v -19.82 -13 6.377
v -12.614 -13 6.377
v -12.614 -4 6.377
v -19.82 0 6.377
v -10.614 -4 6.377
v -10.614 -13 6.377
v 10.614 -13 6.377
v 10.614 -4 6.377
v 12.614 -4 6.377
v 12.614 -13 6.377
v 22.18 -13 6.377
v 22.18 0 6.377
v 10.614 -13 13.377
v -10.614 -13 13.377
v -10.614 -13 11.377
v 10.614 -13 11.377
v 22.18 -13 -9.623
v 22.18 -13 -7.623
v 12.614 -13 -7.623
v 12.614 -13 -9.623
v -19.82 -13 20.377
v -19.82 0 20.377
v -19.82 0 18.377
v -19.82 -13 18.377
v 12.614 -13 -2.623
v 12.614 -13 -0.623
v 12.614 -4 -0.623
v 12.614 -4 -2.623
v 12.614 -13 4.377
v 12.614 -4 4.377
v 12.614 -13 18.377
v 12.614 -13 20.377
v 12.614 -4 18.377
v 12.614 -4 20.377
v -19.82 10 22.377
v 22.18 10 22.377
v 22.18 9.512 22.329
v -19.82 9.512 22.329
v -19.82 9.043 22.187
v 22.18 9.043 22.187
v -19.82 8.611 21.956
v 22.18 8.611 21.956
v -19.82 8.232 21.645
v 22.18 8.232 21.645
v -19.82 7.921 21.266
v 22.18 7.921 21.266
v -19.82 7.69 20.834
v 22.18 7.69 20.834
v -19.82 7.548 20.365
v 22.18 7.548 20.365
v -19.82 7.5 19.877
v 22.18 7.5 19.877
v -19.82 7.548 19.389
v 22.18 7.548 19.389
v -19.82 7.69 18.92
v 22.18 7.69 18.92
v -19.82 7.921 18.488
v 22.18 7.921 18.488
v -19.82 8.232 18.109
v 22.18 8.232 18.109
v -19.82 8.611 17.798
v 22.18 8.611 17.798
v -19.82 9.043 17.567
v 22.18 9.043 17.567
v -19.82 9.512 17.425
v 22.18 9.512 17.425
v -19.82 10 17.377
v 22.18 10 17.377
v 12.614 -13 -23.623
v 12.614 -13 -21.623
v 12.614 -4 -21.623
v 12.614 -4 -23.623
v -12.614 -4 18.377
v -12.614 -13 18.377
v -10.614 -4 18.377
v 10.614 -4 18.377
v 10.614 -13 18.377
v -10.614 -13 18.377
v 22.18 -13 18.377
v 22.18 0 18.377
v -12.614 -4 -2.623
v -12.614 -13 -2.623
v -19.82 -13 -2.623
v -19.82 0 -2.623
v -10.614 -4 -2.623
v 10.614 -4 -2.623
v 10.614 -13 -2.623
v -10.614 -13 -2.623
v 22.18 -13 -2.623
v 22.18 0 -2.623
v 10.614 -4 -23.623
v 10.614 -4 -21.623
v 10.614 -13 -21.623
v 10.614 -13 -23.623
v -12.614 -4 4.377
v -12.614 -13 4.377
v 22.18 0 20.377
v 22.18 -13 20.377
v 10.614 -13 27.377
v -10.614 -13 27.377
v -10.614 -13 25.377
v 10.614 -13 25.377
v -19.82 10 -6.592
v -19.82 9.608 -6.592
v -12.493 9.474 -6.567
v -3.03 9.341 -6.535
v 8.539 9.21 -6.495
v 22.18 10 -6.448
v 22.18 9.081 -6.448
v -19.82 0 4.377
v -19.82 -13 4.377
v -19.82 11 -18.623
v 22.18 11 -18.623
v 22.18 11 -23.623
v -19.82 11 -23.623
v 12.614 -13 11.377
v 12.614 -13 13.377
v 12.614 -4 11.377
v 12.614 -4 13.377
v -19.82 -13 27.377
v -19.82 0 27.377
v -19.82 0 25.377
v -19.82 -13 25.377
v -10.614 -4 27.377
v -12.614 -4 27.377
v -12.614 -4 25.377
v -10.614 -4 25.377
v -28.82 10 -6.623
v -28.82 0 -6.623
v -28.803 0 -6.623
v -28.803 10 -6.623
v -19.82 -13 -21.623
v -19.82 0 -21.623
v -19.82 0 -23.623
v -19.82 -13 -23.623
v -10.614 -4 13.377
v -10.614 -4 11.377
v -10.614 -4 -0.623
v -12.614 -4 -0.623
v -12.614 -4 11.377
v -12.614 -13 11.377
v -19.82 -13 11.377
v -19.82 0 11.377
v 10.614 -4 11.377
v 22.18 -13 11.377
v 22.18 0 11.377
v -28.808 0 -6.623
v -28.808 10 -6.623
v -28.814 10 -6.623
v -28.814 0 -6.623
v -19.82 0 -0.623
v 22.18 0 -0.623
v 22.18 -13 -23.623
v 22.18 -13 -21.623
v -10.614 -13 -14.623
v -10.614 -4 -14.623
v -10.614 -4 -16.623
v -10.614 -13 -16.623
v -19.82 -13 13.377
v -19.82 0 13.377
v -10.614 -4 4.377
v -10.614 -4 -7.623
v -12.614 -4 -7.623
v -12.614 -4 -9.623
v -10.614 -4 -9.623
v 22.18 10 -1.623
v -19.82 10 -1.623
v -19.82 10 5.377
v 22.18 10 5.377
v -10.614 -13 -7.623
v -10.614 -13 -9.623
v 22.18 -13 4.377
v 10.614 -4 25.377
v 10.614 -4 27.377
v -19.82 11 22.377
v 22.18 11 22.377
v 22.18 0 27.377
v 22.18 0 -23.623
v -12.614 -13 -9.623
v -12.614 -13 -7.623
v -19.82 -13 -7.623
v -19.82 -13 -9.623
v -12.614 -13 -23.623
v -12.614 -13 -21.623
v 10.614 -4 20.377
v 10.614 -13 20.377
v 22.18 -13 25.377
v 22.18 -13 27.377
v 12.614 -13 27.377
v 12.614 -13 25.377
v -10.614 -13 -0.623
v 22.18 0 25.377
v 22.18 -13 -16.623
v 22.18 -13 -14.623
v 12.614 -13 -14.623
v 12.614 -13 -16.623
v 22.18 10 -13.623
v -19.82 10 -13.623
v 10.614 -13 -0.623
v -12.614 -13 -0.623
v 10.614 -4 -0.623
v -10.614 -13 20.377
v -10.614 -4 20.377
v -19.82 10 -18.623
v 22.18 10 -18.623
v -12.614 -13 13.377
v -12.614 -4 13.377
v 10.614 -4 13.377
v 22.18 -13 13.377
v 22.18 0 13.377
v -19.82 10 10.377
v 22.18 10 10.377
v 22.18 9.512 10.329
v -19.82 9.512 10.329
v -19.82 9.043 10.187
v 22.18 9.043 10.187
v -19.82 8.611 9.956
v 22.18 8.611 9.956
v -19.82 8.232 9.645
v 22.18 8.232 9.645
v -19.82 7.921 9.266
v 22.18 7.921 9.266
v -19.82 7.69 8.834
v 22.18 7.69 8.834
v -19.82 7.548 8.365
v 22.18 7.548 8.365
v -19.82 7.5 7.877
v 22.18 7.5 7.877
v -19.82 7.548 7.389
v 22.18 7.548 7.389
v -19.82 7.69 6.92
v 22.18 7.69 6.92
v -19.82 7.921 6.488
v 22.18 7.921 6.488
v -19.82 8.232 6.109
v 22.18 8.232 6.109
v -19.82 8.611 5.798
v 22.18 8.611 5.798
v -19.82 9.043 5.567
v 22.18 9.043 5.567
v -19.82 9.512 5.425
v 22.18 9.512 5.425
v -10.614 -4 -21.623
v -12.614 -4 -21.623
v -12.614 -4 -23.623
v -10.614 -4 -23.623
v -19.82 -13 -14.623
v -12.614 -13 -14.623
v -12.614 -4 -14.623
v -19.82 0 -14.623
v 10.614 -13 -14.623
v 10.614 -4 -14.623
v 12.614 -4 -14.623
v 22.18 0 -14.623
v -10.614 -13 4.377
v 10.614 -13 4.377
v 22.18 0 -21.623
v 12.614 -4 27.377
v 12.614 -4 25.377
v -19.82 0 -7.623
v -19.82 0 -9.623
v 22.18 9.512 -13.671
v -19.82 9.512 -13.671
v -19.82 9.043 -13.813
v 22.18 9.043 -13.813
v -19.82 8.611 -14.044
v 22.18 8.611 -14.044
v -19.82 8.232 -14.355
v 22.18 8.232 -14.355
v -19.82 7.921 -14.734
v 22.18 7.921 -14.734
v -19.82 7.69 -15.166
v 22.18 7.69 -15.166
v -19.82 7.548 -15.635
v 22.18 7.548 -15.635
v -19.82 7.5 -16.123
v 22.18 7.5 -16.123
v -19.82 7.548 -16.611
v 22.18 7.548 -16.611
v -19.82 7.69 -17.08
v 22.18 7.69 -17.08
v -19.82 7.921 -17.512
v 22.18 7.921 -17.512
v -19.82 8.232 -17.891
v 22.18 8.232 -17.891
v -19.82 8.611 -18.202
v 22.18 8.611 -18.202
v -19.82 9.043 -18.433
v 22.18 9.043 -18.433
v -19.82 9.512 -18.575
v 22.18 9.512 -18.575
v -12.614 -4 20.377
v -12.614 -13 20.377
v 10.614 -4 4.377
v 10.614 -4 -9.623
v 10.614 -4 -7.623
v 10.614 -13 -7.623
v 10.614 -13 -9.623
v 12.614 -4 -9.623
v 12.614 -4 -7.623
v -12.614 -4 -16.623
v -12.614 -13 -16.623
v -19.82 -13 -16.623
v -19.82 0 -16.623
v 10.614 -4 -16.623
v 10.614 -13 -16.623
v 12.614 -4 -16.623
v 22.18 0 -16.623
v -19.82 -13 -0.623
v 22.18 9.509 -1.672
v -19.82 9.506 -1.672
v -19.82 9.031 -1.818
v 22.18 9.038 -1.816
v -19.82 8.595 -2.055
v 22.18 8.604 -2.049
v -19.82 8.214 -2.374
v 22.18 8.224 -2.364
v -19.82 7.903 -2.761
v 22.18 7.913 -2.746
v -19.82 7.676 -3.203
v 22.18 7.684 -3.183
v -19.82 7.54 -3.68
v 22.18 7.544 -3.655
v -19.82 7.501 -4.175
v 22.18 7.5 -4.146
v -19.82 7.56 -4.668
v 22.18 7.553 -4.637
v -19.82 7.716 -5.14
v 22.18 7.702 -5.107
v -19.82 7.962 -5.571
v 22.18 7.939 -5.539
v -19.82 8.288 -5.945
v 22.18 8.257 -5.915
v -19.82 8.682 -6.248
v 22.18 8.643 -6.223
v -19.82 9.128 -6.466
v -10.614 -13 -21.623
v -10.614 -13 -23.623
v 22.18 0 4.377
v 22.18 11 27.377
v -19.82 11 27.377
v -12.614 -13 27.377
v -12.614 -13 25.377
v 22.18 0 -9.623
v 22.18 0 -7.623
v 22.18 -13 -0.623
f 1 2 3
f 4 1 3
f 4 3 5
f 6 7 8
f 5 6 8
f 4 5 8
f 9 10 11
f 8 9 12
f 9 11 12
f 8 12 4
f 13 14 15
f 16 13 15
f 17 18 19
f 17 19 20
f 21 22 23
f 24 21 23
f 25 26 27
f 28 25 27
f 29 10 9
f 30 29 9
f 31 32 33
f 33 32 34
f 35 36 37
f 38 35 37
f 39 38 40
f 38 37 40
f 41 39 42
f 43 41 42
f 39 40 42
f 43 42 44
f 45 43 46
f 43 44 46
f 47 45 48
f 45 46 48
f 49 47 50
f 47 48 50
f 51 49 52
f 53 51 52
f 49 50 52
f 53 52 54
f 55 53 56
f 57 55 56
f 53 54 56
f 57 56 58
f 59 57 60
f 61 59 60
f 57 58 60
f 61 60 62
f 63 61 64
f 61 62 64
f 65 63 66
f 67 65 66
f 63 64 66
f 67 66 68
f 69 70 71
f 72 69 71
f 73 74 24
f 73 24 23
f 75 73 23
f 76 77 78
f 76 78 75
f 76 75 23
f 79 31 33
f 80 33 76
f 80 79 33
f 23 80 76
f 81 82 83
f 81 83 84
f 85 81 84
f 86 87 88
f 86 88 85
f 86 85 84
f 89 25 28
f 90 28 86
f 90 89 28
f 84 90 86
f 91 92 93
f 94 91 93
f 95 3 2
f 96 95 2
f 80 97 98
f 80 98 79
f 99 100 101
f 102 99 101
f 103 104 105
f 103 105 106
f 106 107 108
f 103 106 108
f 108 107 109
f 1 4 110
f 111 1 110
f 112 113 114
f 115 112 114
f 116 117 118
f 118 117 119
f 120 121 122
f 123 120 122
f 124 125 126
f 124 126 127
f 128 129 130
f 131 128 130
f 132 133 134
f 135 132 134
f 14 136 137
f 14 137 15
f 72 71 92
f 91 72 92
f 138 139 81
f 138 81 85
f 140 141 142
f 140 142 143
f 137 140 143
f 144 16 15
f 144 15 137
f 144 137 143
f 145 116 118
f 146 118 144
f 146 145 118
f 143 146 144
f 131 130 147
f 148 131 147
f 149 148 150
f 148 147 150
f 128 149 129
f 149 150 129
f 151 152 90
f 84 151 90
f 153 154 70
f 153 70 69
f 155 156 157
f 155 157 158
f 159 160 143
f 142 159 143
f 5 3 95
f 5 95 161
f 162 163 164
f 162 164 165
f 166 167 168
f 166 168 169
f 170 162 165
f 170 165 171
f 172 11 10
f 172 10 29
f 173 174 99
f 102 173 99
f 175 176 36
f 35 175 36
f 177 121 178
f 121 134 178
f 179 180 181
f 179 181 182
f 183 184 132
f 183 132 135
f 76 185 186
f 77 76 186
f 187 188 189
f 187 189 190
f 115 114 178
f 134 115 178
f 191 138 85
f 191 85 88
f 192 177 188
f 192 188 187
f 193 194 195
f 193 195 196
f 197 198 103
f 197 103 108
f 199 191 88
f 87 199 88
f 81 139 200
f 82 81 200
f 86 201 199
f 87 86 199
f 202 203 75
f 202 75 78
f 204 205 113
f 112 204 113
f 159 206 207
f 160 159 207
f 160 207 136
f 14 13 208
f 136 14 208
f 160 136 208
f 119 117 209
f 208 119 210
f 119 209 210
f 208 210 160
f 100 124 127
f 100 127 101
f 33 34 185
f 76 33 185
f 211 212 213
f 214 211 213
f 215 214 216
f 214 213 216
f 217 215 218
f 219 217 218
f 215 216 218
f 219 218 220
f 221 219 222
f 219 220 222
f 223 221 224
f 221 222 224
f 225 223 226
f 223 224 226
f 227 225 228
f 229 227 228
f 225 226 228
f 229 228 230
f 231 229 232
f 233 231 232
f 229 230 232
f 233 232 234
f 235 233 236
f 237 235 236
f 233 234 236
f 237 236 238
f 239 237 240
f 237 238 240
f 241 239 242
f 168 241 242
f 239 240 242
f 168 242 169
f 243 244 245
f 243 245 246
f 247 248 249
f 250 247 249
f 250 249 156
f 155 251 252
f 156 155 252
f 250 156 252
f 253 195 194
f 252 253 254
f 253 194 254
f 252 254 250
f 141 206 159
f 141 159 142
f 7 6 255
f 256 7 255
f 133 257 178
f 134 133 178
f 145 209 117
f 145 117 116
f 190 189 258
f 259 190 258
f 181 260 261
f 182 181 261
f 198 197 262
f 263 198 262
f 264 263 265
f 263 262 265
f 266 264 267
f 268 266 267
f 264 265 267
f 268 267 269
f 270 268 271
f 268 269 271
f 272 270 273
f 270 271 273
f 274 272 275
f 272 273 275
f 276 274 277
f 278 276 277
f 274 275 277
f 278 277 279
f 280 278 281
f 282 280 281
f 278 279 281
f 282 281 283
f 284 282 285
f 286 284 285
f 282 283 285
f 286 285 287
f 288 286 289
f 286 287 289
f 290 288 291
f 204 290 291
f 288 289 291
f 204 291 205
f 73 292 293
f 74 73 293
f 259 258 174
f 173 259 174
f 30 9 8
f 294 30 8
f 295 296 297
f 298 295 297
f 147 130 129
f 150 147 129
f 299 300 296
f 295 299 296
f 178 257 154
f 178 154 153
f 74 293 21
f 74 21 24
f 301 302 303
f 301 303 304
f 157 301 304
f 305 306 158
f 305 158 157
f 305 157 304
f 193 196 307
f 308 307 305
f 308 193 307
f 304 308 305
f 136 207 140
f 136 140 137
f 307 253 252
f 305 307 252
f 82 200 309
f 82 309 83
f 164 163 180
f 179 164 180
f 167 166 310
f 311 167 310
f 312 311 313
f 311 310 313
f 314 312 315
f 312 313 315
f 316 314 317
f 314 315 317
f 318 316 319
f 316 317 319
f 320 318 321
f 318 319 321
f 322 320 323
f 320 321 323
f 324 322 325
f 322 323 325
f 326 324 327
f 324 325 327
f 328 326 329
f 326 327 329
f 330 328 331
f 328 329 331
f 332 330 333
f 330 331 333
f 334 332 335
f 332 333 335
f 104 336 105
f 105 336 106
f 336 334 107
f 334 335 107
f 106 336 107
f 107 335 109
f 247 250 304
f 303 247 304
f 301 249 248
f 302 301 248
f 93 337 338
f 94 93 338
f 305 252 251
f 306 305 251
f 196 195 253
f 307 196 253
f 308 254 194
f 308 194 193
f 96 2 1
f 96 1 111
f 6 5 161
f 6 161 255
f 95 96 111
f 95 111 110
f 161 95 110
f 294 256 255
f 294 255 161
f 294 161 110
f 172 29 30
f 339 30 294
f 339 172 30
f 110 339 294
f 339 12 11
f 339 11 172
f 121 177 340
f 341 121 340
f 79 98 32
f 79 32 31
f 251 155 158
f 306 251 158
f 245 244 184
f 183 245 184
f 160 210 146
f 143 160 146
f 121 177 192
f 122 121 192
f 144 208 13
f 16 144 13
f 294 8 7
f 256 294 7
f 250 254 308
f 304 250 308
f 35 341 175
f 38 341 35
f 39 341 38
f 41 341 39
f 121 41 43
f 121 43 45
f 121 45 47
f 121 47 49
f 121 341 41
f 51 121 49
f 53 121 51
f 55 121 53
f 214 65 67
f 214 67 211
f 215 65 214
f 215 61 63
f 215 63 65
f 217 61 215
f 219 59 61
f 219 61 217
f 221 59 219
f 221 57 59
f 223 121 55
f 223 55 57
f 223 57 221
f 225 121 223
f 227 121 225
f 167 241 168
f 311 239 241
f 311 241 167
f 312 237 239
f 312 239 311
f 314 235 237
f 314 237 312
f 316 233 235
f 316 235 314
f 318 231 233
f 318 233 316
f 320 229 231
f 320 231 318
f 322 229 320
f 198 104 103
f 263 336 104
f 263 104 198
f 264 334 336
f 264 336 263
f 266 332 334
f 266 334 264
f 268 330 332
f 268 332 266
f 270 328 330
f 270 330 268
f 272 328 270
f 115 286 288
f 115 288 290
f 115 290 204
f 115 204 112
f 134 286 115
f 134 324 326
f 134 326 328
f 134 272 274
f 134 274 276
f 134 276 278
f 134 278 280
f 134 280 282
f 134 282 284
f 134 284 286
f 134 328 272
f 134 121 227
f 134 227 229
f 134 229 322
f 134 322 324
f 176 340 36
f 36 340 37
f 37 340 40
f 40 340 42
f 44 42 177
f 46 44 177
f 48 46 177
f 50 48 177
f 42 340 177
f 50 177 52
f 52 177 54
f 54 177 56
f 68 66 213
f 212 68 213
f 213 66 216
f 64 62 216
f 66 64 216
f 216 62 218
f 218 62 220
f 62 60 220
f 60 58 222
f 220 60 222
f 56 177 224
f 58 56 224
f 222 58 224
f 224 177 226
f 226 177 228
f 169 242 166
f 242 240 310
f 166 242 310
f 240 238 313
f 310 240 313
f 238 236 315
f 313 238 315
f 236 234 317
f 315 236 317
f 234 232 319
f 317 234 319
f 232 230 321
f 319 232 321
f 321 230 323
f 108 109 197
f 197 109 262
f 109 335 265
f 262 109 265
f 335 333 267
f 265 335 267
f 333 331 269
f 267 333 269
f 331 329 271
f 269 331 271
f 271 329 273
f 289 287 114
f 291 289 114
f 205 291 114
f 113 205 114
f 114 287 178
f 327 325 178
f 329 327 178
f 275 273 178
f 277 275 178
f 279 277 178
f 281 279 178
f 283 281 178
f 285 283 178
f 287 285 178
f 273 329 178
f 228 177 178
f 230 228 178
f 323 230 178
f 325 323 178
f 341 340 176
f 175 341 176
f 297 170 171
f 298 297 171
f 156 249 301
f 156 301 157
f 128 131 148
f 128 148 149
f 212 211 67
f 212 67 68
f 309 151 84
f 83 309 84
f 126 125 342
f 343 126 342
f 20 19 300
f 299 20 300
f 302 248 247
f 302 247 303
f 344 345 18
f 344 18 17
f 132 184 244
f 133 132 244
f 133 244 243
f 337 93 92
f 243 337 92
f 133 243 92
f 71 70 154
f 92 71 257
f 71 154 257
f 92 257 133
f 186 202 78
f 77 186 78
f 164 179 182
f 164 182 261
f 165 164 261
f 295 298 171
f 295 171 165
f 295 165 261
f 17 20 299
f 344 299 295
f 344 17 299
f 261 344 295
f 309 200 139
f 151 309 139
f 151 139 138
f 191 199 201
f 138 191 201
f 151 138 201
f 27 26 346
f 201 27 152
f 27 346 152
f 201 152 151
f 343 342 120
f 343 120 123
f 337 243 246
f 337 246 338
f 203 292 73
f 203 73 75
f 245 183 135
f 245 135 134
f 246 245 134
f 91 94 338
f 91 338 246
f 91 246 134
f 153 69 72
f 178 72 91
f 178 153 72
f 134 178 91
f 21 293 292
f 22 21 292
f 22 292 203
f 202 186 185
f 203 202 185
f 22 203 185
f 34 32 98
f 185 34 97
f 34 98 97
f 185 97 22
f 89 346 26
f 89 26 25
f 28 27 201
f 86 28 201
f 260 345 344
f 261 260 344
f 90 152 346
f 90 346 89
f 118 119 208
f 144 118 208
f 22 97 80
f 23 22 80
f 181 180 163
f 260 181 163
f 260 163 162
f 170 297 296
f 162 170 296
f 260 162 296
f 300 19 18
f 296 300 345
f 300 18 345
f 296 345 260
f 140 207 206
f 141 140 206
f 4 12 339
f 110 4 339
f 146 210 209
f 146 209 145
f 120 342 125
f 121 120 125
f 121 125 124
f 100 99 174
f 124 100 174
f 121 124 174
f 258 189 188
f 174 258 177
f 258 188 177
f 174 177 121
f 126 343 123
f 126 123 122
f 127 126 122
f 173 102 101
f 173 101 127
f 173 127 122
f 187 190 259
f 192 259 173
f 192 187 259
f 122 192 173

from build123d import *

# Parameters (mm, degrees)
SKETCH2_W             = 42
SKETCH2_H             = 7
BOSS_EXTRUDE1_DEPTH   = 10
BOSS_EXTRUDE1_2_DEPTH = 10
BOSS_EXTRUDE1_3_DEPTH = 10
BOSS_EXTRUDE1_4_DEPTH = 10
BOSS_EXTRUDE2_DEPTH   = 42
SKETCH4_W             = 2
SKETCH4_H             = 13
BOSS_EXTRUDE3_DEPTH   = 42
LPATTERN1_COUNT       = 8
LPATTERN1_PITCH       = 7
CUT_EXTRUDE1_DEPTH    = 51


with BuildPart() as part:
    # Sketch2 → Boss-Extrude1 (new body)
    with BuildSketch(Plane(origin=(0, 0, 0), x_dir=(1, 0, 0), z_dir=(0, 1, 0))):
        with Locations((1.180250214, -1.876958583)):
            Rectangle(SKETCH2_W, SKETCH2_H)
    extrude(amount=BOSS_EXTRUDE1_DEPTH)



with BuildPart() as body_2:
    # Sketch2 → Boss-Extrude1 2 (new body)
    with BuildSketch(Plane(origin=(0, 0, 0), x_dir=(1, 0, 0), z_dir=(0, 1, 0))):
        with BuildLine():
            Line((-28.819749786, 6.623041417), (-28.802598773, 6.622982585))
            ThreePointArc((-28.802598773, 6.622982585), (-28.811174229, 6.623026709), (-28.819749786, 6.623041417))
        make_face()
    extrude(amount=BOSS_EXTRUDE1_2_DEPTH)


with BuildPart() as body_3:
    # Sketch2 → Boss-Extrude1 3 (new body)
    with BuildSketch(Plane(origin=(0, 0, 0), x_dir=(1, 0, 0), z_dir=(0, 1, 0))):
        Polygon((-19.819749786, 6.592169231), (22.180250214, 6.448099027), (22.180250214, 13.623041417), (-19.819749786, 13.623041417), align=None)
    extrude(amount=BOSS_EXTRUDE1_3_DEPTH)


with BuildPart() as body_4:
    # Sketch2 → Boss-Extrude1 4 (new body)
    with BuildSketch(Plane(origin=(0, 0, 0), x_dir=(1, 0, 0), z_dir=(0, 1, 0))):
        with Locations((1.180250214, -13.876958583)):
            Rectangle(SKETCH2_W, SKETCH2_H)
    extrude(amount=BOSS_EXTRUDE1_4_DEPTH)


with BuildPart() as part_1:
    add(part.part)

    add(body_3.part)  # Boss-Extrude2 merges body 3

    add(body_4.part)  # Boss-Extrude2 merges body 4
    # Sketch3 → Boss-Extrude2 (add)
    with BuildSketch(Plane(origin=(22.180250214, 0, 0), x_dir=(0, 0, -1), z_dir=(1, 0, 0))):
        with BuildLine():
            Line((-17.376958583, 10), (-10.376958583, 10))
            ThreePointArc((-10.376958583, 10), (-7.876958583, 7.5), (-5.376958583, 10))
            Line((-5.376958583, 10), (1.623041417, 10))
            ThreePointArc((1.623041417, 10), (4.123041417, 7.5), (6.623041417, 10))
            Line((6.623041417, 10), (13.623041417, 10))
            ThreePointArc((13.623041417, 10), (16.123041417, 7.5), (18.623041417, 10))
            Line((18.623041417, 10), (18.623041417, 11))
            Line((18.623041417, 11), (23.623041417, 11))
            Line((23.623041417, 11), (23.623041417, 0))
            Line((23.623041417, 0), (-27.376958583, 0))
            Line((-27.376958583, 0), (-27.376958583, 11))
            Line((-27.376958583, 11), (-22.376958583, 11))
            Line((-22.376958583, 11), (-22.376958583, 10))
            ThreePointArc((-22.376958583, 10), (-19.876958583, 7.5), (-17.376958583, 10))
        make_face()
    extrude(amount=-BOSS_EXTRUDE2_DEPTH)


with BuildPart() as body_3_2:
    # Sketch4 → Boss-Extrude3 (new body)
    with BuildSketch(Plane(origin=(22.180250214, 0, 0), x_dir=(0, 0, -1), z_dir=(1, 0, 0))):
        with Locations((22.623041417, -6.5)):
            Rectangle(SKETCH4_W, SKETCH4_H)
    boss_extrude3 = extrude(amount=-BOSS_EXTRUDE3_DEPTH)


with BuildPart() as lpattern1_1:
    # LPattern1: pattern copy
    add(boss_extrude3.moved(Location(Vector(0, 0, 1) * (1 * LPATTERN1_PITCH))))


with BuildPart() as lpattern1_2:
    # LPattern1: pattern copy
    add(boss_extrude3.moved(Location(Vector(0, 0, 1) * (2 * LPATTERN1_PITCH))))


with BuildPart() as lpattern1_3:
    # LPattern1: pattern copy
    add(boss_extrude3.moved(Location(Vector(0, 0, 1) * (3 * LPATTERN1_PITCH))))


with BuildPart() as lpattern1_4:
    # LPattern1: pattern copy
    add(boss_extrude3.moved(Location(Vector(0, 0, 1) * (4 * LPATTERN1_PITCH))))


with BuildPart() as lpattern1_5:
    # LPattern1: pattern copy
    add(boss_extrude3.moved(Location(Vector(0, 0, 1) * (5 * LPATTERN1_PITCH))))


with BuildPart() as lpattern1_6:
    # LPattern1: pattern copy
    add(boss_extrude3.moved(Location(Vector(0, 0, 1) * (6 * LPATTERN1_PITCH))))


with BuildPart() as lpattern1_7:
    # LPattern1: pattern copy
    add(boss_extrude3.moved(Location(Vector(0, 0, 1) * (7 * LPATTERN1_PITCH))))


with BuildPart() as cut_extrude1_tool:
    # Sketch5 → Cut-Extrude1 (new body)
    with BuildSketch(Plane.XY.offset(27.376958583)):
        Polygon((12.613836154, -13), (12.613836154, -4), (10.613836154, -4), (10.613836154, -14.372038729), (12.613836154, -14.372038729), align=None)
        Polygon((-12.613836154, -14.372038729), (-12.613836154, -13), (-12.613836154, -4), (-10.613836154, -4), (-10.613836154, -14.372038729), align=None)
    extrude(amount=-CUT_EXTRUDE1_DEPTH)


with BuildPart() as body_3_2_1:
    add(body_3_2.part)

    # Cut-Extrude1: cut by cut_extrude1_tool
    add(cut_extrude1_tool.part, mode=Mode.SUBTRACT)


with BuildPart() as lpattern1_1_1:
    add(lpattern1_1.part)

    # Cut-Extrude1: cut by cut_extrude1_tool
    add(cut_extrude1_tool.part, mode=Mode.SUBTRACT)


with BuildPart() as lpattern1_2_1:
    add(lpattern1_2.part)

    # Cut-Extrude1: cut by cut_extrude1_tool
    add(cut_extrude1_tool.part, mode=Mode.SUBTRACT)


with BuildPart() as lpattern1_3_1:
    add(lpattern1_3.part)

    # Cut-Extrude1: cut by cut_extrude1_tool
    add(cut_extrude1_tool.part, mode=Mode.SUBTRACT)


with BuildPart() as lpattern1_4_1:
    add(lpattern1_4.part)

    # Cut-Extrude1: cut by cut_extrude1_tool
    add(cut_extrude1_tool.part, mode=Mode.SUBTRACT)


with BuildPart() as lpattern1_5_1:
    add(lpattern1_5.part)

    # Cut-Extrude1: cut by cut_extrude1_tool
    add(cut_extrude1_tool.part, mode=Mode.SUBTRACT)


with BuildPart() as lpattern1_6_1:
    add(lpattern1_6.part)

    # Cut-Extrude1: cut by cut_extrude1_tool
    add(cut_extrude1_tool.part, mode=Mode.SUBTRACT)


with BuildPart() as lpattern1_7_1:
    add(lpattern1_7.part)

    # Cut-Extrude1: cut by cut_extrude1_tool
    add(cut_extrude1_tool.part, mode=Mode.SUBTRACT)


solid = Compound([body_2.part, part_1.part, body_3_2_1.part, lpattern1_1_1.part, lpattern1_2_1.part, lpattern1_3_1.part, lpattern1_4_1.part, lpattern1_5_1.part, lpattern1_6_1.part, lpattern1_7_1.part])
